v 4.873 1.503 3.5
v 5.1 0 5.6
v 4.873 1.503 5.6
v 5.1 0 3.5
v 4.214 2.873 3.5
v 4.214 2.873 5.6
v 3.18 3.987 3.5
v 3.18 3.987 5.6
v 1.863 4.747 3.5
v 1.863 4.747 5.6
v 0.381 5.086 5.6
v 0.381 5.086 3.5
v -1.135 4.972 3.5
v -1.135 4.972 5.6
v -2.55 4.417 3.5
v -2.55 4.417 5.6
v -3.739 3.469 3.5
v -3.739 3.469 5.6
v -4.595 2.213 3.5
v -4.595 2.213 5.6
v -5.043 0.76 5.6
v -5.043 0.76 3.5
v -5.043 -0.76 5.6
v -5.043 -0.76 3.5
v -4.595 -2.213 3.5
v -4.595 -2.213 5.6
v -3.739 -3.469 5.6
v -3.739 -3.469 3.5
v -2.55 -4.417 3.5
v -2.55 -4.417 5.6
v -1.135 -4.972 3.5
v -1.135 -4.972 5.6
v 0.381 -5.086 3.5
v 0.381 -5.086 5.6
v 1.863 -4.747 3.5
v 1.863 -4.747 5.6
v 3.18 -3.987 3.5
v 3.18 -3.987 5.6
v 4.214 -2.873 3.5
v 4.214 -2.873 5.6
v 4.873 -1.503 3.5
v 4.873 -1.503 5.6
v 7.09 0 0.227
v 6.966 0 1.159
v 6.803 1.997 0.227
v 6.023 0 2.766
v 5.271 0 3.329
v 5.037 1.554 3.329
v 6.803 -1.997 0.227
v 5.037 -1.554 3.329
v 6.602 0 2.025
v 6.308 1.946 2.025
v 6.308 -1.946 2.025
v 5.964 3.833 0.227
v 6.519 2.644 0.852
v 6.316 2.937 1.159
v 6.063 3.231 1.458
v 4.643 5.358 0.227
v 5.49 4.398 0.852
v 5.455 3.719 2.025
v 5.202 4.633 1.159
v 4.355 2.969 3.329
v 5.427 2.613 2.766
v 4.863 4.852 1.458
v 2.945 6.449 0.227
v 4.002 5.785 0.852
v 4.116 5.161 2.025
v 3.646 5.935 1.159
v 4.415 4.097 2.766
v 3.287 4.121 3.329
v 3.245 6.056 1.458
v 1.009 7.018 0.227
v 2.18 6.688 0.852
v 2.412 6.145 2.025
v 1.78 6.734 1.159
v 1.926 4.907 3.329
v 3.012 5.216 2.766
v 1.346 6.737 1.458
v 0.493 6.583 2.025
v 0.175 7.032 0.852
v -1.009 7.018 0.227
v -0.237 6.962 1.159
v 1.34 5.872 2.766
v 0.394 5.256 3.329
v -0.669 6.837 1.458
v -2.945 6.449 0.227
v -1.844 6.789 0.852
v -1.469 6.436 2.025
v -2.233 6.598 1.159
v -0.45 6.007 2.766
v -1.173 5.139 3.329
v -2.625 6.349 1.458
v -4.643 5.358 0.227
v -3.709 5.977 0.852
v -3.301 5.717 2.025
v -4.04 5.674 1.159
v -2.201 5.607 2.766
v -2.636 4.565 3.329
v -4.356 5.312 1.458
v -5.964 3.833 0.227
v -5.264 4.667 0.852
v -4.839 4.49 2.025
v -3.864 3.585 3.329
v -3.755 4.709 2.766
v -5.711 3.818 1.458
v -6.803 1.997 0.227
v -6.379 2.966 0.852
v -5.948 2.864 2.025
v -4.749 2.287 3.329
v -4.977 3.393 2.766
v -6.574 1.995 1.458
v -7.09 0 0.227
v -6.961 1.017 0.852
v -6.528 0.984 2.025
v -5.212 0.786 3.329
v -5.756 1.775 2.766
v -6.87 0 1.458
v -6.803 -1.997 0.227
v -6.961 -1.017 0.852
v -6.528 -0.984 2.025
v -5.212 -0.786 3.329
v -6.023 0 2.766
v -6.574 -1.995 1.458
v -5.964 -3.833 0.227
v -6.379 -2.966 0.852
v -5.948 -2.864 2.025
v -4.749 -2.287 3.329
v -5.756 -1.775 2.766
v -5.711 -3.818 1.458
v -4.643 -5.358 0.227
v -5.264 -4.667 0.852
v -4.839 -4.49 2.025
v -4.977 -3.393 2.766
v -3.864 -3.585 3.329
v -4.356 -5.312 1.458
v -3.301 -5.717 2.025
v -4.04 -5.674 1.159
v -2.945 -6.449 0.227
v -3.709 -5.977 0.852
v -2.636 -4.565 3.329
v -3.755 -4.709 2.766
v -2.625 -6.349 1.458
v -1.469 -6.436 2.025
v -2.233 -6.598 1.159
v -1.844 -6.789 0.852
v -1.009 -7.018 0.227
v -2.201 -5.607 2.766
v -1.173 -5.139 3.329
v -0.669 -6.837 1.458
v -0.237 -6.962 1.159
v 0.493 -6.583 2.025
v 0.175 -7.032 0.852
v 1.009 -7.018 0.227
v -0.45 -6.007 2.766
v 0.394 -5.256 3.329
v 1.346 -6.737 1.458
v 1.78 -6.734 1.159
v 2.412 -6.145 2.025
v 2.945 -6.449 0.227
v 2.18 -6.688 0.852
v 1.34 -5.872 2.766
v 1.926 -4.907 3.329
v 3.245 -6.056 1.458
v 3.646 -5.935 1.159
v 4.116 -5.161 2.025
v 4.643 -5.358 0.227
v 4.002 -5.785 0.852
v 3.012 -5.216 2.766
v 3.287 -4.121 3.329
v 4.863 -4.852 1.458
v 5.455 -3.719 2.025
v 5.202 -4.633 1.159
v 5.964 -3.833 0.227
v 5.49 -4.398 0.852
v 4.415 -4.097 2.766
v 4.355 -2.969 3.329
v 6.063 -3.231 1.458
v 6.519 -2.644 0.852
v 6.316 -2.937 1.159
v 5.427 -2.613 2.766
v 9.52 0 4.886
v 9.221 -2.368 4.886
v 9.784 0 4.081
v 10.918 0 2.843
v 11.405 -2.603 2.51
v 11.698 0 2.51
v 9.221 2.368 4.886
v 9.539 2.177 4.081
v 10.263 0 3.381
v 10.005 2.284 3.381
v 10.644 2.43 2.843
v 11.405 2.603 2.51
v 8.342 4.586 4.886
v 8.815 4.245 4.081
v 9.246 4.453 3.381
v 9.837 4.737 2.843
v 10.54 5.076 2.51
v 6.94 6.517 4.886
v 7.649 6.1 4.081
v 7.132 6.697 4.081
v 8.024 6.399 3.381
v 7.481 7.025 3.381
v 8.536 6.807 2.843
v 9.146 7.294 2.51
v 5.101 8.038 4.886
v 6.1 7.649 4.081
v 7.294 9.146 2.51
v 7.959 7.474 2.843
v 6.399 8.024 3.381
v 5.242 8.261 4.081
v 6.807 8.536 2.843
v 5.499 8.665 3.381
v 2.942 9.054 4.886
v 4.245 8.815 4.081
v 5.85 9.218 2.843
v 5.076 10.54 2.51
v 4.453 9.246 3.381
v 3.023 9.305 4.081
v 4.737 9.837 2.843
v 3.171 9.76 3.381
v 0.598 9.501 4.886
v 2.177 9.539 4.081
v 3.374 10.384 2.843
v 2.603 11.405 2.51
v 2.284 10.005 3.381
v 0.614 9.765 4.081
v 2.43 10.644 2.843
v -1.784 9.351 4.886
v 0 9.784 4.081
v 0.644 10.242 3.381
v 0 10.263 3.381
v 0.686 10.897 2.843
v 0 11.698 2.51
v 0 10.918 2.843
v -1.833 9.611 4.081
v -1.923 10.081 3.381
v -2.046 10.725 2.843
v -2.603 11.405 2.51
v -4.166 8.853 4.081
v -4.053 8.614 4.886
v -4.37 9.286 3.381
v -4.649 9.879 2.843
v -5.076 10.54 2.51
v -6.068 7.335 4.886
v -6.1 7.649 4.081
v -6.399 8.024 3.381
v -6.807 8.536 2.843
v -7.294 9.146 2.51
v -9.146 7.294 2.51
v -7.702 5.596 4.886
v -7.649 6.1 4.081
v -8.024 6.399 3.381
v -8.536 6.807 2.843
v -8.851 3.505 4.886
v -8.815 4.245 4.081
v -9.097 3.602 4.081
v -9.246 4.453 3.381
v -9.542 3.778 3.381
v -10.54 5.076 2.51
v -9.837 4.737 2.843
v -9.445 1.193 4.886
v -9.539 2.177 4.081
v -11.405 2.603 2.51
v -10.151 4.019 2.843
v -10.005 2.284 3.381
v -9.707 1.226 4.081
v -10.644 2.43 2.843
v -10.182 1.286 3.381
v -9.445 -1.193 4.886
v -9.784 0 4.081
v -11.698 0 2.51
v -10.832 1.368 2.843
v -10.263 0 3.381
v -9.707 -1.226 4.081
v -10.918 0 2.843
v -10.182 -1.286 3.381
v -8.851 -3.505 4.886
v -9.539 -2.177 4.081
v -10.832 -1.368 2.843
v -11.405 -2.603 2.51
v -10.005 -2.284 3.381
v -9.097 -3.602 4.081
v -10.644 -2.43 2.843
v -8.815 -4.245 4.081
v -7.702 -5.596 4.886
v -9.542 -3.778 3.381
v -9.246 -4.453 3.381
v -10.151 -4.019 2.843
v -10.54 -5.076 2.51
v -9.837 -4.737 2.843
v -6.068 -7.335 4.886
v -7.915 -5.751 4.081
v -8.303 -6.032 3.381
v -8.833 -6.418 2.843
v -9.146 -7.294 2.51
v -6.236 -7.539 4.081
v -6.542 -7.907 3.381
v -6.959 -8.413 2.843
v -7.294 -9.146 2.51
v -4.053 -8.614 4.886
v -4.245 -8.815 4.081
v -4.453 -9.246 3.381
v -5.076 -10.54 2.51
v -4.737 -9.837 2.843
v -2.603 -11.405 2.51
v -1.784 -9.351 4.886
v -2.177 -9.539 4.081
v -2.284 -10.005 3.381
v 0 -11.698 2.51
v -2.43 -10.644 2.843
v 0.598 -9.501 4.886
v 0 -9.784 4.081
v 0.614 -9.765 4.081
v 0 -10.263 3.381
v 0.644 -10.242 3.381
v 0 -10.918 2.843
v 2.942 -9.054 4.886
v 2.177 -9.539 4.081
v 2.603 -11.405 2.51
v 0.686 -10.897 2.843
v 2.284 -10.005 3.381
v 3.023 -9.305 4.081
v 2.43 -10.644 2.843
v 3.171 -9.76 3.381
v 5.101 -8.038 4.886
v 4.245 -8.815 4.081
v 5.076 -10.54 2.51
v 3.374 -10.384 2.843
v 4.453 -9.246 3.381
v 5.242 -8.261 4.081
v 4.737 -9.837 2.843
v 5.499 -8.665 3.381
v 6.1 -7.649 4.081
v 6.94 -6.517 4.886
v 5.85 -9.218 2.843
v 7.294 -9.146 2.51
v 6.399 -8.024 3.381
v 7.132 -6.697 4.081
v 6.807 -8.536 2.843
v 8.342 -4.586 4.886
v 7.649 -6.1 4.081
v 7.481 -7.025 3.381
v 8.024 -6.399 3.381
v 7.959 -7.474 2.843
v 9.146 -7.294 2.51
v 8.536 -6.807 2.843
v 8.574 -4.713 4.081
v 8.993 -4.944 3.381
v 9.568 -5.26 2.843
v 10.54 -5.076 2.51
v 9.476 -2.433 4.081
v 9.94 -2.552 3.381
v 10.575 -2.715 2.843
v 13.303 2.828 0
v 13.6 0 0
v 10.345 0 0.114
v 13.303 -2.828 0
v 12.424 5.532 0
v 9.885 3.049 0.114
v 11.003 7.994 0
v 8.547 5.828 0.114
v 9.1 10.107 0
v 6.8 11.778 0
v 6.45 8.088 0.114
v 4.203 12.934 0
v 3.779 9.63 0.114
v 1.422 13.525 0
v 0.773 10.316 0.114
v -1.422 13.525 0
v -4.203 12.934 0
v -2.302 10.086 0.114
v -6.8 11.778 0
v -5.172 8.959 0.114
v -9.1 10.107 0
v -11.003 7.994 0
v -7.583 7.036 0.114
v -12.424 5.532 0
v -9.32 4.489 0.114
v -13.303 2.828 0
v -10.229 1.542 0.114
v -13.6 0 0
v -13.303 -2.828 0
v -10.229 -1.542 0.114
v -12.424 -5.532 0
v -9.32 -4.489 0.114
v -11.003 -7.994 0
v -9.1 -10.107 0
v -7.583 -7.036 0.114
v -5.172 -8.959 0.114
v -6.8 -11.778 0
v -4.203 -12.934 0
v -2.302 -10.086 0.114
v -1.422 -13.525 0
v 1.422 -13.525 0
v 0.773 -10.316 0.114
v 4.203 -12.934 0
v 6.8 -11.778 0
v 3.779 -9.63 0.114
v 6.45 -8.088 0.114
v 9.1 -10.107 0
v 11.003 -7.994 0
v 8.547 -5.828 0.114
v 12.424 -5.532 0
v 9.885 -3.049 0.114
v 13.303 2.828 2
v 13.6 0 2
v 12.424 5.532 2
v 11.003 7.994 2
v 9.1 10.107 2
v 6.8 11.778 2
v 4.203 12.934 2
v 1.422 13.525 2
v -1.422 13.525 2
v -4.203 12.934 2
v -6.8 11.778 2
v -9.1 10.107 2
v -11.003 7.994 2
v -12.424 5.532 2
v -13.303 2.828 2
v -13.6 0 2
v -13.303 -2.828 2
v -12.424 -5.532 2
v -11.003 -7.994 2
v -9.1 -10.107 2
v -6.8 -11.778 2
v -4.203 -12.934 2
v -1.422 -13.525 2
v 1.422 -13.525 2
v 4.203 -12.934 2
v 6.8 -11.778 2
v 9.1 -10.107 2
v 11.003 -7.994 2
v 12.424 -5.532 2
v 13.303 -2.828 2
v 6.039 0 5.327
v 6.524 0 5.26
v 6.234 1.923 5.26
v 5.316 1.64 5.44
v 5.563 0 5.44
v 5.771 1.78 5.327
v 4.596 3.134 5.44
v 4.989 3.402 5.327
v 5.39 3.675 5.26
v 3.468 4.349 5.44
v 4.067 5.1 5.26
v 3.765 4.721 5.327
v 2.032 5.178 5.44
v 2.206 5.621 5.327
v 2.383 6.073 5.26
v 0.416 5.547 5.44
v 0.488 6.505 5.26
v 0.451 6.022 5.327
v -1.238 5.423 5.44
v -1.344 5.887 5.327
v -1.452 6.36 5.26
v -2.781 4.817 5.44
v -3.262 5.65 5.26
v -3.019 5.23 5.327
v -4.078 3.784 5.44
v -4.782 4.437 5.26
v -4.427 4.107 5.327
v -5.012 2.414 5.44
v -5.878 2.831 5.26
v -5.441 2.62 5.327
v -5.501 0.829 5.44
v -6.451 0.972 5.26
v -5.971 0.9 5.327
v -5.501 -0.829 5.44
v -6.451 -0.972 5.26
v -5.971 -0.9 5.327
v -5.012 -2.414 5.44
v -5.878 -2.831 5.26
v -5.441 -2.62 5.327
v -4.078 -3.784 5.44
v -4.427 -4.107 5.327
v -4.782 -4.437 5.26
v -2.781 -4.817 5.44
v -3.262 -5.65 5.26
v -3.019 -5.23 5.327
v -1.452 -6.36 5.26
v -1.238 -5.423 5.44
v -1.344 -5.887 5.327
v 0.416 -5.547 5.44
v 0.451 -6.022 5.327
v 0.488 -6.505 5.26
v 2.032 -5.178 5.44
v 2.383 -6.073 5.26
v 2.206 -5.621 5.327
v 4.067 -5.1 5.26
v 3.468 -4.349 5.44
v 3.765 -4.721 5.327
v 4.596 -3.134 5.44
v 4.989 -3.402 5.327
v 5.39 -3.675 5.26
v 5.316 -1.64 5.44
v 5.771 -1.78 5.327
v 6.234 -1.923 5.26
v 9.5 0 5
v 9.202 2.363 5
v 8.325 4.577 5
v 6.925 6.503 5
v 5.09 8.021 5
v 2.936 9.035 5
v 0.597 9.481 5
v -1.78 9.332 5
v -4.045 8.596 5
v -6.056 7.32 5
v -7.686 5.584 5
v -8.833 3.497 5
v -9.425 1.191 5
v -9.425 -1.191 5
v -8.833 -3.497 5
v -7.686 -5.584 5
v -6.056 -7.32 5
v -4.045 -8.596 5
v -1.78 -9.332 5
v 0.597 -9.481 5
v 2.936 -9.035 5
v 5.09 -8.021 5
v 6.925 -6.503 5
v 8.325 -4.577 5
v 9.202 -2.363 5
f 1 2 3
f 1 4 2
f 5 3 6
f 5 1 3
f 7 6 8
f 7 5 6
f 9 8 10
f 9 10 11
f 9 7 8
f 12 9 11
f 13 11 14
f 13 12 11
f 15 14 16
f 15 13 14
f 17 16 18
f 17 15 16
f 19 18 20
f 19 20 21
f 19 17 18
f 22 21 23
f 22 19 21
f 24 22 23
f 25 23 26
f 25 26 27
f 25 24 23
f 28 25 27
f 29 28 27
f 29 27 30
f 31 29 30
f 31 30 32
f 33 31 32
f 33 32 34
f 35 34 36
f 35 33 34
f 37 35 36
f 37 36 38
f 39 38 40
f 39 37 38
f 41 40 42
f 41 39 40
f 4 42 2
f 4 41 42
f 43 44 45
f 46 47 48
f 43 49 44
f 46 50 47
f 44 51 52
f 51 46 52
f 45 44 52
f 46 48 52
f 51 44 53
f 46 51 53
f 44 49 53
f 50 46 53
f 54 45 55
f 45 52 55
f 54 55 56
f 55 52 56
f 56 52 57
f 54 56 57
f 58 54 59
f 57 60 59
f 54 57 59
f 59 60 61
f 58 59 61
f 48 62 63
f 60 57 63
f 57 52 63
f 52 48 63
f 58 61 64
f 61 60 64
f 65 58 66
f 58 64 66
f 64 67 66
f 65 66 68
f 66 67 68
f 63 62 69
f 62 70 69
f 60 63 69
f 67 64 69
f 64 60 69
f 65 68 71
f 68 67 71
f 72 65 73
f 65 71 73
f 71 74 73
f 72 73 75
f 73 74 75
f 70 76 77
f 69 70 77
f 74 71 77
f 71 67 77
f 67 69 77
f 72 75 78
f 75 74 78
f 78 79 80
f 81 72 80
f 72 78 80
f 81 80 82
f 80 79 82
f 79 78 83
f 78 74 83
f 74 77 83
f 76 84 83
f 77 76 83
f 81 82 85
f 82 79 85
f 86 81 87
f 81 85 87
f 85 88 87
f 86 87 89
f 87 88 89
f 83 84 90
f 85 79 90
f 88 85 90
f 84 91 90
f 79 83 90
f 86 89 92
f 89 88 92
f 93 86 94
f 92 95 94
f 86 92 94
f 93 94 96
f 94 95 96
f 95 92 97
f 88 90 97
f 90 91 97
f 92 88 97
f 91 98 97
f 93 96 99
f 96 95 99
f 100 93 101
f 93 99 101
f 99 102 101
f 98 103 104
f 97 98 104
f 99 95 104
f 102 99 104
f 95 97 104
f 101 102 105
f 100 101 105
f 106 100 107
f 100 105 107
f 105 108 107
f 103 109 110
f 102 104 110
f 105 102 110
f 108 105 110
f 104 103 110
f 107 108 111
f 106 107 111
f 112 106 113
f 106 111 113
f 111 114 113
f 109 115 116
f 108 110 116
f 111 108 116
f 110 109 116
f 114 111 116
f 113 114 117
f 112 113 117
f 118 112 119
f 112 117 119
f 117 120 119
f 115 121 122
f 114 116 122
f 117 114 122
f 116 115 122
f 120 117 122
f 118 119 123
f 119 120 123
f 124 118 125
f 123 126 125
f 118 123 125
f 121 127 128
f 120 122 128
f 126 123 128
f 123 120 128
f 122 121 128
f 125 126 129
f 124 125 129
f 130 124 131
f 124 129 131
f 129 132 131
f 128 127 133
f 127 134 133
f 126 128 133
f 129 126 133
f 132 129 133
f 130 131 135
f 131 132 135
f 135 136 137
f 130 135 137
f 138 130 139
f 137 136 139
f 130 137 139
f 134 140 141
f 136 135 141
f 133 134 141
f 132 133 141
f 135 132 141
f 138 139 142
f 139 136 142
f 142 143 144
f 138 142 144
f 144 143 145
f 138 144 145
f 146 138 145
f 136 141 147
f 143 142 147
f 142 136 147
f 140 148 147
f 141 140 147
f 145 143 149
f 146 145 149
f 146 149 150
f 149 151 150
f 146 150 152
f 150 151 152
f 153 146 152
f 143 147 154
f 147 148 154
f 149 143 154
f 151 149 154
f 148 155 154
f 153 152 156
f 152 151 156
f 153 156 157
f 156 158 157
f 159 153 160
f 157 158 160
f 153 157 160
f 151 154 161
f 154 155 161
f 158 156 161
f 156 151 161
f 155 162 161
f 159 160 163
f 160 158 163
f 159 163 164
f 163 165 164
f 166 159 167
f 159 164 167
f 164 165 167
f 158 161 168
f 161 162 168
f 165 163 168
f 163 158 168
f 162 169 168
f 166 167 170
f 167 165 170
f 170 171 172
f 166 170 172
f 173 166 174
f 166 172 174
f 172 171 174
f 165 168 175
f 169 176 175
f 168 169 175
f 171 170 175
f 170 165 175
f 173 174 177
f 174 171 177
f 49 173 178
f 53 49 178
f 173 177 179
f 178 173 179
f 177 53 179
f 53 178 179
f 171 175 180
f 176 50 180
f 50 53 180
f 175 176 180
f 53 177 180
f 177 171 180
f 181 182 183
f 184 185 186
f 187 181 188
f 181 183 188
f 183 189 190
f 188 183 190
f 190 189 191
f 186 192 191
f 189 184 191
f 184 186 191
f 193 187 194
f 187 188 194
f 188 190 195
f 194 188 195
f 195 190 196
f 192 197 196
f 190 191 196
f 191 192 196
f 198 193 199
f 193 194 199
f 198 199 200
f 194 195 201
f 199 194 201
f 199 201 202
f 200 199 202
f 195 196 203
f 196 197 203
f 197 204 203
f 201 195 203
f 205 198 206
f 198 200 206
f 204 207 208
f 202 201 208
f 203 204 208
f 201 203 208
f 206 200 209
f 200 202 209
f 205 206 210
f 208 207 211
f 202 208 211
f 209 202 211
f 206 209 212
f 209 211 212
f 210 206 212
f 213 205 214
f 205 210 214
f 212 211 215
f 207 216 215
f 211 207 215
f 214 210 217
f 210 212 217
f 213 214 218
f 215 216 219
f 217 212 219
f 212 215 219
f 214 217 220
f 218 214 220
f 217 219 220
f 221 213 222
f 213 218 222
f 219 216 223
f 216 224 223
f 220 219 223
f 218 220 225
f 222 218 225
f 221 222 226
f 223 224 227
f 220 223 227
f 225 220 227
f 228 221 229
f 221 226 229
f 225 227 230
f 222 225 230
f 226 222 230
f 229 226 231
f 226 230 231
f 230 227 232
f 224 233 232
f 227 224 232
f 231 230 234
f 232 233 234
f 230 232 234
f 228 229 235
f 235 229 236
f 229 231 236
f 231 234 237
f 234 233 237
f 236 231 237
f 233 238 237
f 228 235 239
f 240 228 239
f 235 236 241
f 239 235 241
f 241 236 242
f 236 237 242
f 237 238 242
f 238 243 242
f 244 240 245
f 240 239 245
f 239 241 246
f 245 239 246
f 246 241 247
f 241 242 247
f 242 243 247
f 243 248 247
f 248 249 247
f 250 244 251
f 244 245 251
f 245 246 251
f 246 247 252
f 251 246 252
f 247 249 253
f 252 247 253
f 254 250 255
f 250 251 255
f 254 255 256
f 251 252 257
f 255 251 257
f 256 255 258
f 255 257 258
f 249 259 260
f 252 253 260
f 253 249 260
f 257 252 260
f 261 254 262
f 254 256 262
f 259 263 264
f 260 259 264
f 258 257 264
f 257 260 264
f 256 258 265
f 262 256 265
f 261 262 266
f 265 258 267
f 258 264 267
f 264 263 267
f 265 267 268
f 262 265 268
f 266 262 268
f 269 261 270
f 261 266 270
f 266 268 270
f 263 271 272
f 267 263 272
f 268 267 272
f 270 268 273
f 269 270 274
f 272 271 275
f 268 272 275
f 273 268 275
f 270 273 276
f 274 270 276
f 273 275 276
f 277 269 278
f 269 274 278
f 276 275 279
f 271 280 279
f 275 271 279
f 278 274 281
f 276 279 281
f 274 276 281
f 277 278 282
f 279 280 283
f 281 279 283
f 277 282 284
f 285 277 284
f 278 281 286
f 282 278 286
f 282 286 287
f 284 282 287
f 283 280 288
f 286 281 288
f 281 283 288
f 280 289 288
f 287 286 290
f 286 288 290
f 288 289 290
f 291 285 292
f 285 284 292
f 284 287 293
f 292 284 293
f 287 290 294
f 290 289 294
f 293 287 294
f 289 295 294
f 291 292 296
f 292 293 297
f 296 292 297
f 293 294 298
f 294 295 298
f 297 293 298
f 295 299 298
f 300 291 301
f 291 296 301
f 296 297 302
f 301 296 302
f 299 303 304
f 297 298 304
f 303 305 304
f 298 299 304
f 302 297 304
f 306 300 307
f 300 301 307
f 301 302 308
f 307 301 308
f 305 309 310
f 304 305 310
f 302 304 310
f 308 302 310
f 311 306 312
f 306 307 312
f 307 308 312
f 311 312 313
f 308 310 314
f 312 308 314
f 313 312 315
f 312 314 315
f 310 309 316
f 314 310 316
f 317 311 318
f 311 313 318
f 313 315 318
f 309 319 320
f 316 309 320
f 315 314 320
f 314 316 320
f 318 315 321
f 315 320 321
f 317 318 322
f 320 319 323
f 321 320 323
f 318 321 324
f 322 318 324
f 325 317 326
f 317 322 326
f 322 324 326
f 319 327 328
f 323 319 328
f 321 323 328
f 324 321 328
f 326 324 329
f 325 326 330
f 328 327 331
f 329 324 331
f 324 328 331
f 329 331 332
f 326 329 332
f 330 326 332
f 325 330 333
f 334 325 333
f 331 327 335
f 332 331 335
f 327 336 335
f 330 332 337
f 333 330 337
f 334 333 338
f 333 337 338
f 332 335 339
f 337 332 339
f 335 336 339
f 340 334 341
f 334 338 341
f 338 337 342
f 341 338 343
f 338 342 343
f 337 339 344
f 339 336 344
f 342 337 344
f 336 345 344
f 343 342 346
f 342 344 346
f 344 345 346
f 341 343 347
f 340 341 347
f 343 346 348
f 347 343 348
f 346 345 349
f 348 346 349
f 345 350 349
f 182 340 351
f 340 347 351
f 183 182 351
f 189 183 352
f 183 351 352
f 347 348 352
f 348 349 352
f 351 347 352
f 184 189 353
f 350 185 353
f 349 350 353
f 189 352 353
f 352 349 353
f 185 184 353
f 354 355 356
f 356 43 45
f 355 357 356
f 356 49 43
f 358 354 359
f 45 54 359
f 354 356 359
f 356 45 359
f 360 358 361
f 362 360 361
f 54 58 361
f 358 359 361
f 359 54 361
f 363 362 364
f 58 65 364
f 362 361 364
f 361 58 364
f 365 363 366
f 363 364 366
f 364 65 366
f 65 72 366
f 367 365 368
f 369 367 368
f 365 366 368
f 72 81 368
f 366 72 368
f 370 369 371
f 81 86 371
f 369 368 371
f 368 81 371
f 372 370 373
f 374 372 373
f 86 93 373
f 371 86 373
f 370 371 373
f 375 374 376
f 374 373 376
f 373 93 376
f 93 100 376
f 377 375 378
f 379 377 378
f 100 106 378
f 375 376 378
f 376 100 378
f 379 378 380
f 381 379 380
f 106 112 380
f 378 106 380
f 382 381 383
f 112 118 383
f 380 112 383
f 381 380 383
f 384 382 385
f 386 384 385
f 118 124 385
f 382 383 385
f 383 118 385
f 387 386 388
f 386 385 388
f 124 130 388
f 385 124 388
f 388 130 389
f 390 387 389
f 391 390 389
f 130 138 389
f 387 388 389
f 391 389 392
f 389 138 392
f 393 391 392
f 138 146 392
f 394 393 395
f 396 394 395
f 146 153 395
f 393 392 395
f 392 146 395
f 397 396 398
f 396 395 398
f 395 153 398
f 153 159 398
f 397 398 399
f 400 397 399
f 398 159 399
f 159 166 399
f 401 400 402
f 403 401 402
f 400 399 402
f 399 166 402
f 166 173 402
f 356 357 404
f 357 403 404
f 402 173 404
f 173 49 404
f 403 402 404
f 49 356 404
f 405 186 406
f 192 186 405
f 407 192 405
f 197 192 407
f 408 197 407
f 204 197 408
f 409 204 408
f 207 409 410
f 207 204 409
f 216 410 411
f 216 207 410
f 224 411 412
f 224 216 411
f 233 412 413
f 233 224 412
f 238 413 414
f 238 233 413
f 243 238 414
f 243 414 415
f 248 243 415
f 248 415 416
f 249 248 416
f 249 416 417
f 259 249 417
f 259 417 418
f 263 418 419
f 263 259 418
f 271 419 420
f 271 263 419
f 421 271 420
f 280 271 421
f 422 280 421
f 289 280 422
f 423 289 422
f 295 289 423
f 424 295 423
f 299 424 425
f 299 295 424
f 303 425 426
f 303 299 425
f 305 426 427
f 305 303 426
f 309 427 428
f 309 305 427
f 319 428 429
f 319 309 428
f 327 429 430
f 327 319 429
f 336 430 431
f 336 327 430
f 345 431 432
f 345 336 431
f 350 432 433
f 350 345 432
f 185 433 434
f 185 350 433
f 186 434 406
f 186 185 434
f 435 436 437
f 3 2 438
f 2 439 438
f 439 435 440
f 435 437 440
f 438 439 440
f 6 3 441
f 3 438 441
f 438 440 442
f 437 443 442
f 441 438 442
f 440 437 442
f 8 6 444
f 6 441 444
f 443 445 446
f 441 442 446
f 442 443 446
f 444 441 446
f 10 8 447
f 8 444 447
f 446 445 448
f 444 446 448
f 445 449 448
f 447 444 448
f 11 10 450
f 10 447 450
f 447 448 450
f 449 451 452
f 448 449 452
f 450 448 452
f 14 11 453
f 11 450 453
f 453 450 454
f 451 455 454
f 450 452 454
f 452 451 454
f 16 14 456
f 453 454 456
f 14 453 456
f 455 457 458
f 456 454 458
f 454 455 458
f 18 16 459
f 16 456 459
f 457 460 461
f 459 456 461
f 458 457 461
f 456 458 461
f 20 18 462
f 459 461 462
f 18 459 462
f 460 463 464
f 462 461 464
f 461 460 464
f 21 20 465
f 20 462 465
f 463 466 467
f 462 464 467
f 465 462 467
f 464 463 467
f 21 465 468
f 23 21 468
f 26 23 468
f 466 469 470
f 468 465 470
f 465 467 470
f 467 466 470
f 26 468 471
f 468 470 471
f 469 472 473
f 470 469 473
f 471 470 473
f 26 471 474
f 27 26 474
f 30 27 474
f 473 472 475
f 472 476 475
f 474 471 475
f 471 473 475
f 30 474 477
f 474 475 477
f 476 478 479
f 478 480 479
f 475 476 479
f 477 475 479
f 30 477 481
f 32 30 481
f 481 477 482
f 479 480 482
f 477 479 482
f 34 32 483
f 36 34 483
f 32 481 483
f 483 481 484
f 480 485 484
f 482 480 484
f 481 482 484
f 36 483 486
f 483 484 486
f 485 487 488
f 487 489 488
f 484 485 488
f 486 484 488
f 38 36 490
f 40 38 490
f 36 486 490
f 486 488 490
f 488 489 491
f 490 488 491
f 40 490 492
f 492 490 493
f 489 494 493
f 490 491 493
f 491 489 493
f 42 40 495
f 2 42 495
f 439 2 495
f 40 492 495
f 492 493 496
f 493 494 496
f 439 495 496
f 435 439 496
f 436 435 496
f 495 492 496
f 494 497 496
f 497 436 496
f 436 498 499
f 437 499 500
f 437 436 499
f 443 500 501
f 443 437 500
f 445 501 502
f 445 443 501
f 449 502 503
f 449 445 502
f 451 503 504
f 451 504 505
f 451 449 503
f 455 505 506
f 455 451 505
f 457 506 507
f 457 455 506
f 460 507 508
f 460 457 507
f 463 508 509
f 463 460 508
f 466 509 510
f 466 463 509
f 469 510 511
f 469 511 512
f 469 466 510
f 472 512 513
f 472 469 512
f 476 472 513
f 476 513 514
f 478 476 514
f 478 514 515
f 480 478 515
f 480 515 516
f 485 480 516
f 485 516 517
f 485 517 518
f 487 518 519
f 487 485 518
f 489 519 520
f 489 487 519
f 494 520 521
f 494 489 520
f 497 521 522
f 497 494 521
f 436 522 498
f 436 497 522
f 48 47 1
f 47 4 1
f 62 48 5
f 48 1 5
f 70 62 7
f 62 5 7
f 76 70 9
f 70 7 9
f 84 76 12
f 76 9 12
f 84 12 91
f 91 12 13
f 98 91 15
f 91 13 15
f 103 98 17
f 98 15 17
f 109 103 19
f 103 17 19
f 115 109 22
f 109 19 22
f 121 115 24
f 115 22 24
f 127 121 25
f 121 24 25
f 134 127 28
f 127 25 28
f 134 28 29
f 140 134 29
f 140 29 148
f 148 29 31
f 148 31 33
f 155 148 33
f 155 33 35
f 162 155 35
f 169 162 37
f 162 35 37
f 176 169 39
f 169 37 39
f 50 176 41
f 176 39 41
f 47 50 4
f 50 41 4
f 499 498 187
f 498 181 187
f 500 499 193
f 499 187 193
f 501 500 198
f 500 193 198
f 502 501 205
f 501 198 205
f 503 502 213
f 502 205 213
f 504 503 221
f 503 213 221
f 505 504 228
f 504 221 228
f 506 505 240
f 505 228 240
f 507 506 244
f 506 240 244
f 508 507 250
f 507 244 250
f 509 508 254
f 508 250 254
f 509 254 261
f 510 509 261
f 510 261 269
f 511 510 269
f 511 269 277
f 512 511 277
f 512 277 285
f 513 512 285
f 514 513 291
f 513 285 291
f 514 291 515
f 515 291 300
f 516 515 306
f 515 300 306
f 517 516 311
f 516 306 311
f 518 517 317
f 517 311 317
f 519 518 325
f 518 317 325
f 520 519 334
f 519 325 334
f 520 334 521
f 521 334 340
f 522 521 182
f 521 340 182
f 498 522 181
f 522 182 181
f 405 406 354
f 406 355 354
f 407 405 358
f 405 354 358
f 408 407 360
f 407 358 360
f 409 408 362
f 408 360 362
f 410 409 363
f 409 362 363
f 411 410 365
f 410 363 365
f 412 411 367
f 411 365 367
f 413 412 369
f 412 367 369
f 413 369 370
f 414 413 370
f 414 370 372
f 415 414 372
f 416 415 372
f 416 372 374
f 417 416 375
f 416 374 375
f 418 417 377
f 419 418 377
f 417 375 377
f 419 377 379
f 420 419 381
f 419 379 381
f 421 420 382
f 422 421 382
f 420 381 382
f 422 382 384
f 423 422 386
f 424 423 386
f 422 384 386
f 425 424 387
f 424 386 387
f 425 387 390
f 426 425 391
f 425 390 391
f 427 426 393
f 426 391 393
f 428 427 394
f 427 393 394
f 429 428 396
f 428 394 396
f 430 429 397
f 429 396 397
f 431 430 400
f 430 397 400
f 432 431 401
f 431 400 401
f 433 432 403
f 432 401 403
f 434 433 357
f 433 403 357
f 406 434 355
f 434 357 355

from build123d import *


with BuildPart() as part:
    # Sketch → Revolve (revolve)
    with BuildSketch(Plane.XZ):
        with BuildLine():
            Line((5.1, 5.6), (5.1, 3.5))
            Line((5.271141, 3.328858), (5.1, 3.5))
            ThreePointArc((7.089877, 0.227339), (6.601658, 2.025061), (5.271141, 3.328858))
            Line((13.6, 0), (7.089877, 0.227339))
            Line((13.6, 2), (13.6, 0))
            Line((13.6, 2), (11.697984, 2.50964))
            ThreePointArc((9.520018, 4.886473), (10.262609, 3.380647), (11.697984, 2.50964))
            Line((9.5, 5), (9.520018, 4.886473))
            Line((9.5, 5), (6.52372, 5.260391))
            ThreePointArc((5.1, 5.6), (5.799366, 5.377817), (6.52372, 5.260391))
        make_face()
    revolve(axis=Axis((0, 0, 0), (0, 0, 1)))


solid = part.part
